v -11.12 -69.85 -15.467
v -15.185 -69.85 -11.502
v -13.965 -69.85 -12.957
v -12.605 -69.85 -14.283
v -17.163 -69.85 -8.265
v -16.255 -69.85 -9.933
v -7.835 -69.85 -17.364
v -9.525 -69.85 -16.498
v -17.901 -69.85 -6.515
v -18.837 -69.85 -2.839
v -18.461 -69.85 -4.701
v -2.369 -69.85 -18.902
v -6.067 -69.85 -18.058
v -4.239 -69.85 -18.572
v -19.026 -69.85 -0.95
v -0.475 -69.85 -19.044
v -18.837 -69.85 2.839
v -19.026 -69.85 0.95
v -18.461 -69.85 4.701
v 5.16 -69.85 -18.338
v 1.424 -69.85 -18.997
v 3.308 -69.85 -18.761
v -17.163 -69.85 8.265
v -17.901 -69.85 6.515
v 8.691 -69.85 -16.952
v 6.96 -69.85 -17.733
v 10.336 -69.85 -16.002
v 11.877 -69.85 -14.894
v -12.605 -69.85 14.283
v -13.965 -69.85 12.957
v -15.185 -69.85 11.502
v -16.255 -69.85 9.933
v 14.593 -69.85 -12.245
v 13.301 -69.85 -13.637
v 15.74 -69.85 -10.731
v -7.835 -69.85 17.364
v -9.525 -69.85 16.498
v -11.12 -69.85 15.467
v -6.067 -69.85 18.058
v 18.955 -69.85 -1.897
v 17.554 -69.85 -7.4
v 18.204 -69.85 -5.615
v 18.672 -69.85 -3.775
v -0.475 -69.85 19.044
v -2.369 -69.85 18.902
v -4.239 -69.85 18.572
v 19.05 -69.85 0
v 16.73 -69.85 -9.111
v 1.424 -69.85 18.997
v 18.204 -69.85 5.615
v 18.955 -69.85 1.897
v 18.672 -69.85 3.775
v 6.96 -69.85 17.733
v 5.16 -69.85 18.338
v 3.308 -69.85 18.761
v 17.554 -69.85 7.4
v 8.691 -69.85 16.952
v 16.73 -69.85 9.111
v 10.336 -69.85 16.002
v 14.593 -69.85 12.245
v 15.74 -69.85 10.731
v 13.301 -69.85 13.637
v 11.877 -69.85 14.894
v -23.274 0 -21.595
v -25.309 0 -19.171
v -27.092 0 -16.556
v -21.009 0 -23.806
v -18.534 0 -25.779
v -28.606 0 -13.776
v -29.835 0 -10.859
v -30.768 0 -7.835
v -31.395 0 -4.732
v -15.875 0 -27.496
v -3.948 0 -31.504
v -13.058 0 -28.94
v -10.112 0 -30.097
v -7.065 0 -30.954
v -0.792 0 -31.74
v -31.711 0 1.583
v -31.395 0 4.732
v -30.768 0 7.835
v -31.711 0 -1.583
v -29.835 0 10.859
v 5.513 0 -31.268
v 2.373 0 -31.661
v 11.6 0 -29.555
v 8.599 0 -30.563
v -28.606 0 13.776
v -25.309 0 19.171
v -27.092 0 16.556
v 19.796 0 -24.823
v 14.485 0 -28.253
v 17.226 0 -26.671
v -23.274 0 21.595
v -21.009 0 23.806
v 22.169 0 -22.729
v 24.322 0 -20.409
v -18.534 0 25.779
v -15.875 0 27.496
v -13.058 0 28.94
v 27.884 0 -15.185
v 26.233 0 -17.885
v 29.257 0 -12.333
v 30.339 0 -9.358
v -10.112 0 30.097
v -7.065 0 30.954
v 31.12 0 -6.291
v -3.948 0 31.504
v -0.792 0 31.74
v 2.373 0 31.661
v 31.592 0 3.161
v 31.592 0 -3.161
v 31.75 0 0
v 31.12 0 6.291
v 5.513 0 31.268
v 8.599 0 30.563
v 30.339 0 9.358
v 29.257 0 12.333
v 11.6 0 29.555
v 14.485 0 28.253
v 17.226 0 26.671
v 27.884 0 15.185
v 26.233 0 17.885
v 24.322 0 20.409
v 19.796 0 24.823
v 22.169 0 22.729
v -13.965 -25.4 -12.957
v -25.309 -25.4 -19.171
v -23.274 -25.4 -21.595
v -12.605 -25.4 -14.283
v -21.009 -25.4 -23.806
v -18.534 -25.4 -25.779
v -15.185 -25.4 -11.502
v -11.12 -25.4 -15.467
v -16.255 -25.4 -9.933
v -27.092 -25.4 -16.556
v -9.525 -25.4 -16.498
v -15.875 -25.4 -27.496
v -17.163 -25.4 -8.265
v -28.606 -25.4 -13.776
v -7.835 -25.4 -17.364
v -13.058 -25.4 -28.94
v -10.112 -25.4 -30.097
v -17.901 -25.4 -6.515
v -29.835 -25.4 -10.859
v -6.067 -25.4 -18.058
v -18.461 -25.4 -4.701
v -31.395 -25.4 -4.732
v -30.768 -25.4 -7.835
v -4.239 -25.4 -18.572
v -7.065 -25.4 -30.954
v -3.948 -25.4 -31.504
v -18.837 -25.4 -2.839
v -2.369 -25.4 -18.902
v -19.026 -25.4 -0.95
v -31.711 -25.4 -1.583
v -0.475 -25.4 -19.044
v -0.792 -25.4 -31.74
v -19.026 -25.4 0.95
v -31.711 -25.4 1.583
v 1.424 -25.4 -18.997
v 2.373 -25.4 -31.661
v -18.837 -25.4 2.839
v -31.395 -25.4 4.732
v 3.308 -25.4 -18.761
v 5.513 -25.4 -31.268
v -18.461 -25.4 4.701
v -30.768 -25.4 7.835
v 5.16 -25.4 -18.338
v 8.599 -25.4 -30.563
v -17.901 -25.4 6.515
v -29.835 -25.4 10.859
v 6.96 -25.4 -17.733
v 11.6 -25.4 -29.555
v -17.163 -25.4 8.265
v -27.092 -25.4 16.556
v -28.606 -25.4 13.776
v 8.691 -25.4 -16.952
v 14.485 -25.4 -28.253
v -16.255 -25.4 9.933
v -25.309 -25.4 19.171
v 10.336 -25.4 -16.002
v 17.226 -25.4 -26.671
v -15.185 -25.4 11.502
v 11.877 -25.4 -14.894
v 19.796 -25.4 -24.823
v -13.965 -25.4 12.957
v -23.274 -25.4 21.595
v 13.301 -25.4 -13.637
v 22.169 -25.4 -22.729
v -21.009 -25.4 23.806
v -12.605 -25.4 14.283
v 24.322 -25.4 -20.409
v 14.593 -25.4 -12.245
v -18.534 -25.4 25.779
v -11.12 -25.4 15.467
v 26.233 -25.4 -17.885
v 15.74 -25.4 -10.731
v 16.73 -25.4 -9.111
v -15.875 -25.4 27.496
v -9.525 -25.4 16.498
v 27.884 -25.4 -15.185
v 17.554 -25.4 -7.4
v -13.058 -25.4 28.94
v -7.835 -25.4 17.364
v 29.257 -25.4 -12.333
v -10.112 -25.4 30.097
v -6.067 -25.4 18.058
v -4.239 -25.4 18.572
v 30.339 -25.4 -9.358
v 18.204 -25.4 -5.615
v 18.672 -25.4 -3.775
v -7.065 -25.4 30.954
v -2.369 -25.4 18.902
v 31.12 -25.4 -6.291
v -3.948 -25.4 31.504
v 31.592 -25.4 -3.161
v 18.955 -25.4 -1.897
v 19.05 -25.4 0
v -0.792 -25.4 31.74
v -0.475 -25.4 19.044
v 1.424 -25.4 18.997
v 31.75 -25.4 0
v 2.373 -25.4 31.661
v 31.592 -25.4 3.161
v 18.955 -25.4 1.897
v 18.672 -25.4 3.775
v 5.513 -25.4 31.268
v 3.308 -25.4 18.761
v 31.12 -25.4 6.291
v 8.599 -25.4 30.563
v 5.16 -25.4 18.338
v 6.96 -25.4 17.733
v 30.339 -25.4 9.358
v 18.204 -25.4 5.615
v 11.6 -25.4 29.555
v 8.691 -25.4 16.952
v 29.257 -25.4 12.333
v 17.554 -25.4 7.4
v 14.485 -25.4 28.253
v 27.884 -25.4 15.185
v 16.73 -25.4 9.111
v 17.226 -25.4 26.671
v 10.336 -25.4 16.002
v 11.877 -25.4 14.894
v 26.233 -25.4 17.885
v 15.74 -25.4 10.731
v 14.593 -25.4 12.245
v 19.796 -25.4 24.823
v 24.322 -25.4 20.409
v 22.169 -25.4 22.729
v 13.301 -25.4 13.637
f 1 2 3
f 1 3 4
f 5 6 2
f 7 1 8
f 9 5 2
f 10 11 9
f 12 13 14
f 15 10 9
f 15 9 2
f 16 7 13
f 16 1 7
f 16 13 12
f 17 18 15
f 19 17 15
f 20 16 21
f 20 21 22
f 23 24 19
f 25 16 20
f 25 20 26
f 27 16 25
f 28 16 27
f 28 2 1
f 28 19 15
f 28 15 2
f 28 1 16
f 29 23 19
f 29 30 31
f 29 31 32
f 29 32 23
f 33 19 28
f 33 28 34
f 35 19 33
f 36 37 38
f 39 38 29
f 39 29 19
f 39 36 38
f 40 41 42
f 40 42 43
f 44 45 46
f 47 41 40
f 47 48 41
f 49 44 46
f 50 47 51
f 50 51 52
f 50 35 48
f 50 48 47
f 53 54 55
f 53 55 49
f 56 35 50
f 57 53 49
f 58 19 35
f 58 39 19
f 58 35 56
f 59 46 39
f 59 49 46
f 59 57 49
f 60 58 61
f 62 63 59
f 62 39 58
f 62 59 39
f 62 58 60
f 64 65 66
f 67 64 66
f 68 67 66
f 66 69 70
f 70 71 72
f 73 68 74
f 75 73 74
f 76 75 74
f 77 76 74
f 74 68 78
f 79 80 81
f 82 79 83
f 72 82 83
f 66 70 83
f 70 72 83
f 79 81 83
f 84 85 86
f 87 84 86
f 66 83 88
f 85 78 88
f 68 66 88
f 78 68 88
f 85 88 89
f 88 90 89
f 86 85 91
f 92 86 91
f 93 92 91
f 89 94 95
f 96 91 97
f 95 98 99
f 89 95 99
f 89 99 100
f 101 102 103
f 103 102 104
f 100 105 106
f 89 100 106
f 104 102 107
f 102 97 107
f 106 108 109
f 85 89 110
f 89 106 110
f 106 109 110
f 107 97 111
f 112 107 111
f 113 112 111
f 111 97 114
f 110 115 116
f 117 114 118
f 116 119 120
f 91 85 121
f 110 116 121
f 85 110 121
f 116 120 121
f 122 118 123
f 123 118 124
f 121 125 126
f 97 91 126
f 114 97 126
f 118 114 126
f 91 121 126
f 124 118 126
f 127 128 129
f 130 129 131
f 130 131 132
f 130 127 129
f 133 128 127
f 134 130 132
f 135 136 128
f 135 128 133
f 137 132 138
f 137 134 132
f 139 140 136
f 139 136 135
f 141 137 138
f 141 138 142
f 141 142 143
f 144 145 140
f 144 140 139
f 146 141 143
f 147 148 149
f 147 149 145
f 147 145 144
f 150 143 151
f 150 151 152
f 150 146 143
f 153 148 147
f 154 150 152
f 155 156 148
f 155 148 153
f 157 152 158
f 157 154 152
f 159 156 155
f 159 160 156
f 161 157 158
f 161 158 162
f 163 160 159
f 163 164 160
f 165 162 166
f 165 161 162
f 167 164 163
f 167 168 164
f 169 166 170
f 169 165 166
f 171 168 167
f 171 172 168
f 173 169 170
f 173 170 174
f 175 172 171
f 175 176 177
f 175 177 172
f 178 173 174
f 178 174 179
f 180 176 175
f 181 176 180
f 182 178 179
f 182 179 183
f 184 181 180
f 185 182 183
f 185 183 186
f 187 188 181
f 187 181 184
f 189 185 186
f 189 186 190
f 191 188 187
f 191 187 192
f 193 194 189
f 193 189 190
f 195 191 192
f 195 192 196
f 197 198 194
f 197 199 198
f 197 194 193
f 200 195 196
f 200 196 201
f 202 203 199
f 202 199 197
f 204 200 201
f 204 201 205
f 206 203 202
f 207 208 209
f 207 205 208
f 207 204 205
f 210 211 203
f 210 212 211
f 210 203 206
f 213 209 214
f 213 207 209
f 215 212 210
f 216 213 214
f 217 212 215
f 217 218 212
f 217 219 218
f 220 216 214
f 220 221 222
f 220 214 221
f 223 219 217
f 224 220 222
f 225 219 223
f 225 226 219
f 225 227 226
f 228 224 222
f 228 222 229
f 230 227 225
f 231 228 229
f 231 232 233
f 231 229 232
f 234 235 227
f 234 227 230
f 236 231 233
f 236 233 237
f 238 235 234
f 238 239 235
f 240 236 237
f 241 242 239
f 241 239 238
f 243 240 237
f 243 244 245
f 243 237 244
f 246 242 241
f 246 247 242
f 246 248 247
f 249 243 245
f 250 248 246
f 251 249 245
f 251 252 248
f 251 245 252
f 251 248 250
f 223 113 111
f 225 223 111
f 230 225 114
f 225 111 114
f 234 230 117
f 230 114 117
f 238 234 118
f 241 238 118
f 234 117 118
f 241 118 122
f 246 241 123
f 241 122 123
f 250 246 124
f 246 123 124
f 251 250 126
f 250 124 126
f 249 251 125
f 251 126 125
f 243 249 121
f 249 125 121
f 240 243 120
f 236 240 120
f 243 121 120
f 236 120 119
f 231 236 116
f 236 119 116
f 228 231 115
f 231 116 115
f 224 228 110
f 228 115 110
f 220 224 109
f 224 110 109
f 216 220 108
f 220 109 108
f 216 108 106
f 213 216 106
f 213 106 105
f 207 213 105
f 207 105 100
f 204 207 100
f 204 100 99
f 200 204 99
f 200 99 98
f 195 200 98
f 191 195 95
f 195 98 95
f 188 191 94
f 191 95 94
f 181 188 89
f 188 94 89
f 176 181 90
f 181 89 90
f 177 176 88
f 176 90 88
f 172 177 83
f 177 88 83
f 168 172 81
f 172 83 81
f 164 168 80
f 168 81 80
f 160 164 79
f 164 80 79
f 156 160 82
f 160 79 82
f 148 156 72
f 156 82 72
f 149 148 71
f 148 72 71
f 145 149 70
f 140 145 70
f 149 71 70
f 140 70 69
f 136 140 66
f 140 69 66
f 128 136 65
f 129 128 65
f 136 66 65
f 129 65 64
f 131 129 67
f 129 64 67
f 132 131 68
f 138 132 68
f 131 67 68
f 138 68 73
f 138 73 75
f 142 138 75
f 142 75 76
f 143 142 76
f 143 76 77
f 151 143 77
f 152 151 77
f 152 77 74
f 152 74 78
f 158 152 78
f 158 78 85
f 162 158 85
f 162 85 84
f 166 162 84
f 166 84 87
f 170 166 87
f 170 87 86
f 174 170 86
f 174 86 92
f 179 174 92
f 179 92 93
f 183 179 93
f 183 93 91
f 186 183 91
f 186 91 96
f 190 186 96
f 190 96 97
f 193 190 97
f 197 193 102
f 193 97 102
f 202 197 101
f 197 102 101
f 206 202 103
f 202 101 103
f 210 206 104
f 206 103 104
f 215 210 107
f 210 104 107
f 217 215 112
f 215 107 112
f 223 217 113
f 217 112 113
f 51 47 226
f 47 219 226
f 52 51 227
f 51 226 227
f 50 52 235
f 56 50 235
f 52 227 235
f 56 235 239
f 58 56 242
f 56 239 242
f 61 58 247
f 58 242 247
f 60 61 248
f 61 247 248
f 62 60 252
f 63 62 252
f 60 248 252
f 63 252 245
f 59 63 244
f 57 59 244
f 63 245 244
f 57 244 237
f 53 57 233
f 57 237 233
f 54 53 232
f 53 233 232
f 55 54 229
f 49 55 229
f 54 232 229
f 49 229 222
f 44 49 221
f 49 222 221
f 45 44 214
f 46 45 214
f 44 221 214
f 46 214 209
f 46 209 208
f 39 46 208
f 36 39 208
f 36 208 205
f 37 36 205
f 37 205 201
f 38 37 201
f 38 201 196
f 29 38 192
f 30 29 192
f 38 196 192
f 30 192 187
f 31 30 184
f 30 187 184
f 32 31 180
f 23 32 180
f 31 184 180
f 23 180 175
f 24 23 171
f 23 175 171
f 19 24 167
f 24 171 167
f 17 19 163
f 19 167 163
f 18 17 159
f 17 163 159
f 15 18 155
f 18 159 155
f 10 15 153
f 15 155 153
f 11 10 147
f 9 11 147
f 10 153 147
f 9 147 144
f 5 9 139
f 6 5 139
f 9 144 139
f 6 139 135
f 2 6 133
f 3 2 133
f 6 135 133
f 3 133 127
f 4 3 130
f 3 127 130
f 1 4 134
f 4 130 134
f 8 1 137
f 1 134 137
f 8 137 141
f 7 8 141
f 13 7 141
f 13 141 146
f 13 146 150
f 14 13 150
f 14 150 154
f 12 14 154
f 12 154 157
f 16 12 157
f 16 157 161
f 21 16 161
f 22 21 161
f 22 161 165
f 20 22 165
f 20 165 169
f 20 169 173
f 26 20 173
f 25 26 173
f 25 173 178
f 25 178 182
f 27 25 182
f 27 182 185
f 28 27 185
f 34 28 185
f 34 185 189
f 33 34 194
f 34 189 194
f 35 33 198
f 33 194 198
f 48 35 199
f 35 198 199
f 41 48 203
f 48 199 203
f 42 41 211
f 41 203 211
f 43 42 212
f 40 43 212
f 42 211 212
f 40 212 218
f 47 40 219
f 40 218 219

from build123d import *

# Parameters (mm, degrees)
F0_R     = 19.05
F1_DEPTH = 44.45
F0_R_2   = 31.75
F2_DEPTH = 25.4
F3_DEPTH = 25.4


with BuildPart() as f1:
    # F0 (on Front) → F1 (new body)
    with BuildSketch(Plane.XZ):
        Circle(F0_R)
    extrude(amount=F1_DEPTH)

    # F0 (on Front) → F2 (join)
    with BuildSketch(Plane.XZ):
        Circle(F0_R_2)
        Circle(F0_R, mode=Mode.SUBTRACT)
    extrude(amount=F2_DEPTH)

    # F3 (add): a face of the model
    f3_faces = [f1.faces().sort_by_distance(p)[0] for p in [
        (0, -44.45, 0),
    ]]
    extrude(f3_faces, amount=F3_DEPTH)


solid = f1.part
